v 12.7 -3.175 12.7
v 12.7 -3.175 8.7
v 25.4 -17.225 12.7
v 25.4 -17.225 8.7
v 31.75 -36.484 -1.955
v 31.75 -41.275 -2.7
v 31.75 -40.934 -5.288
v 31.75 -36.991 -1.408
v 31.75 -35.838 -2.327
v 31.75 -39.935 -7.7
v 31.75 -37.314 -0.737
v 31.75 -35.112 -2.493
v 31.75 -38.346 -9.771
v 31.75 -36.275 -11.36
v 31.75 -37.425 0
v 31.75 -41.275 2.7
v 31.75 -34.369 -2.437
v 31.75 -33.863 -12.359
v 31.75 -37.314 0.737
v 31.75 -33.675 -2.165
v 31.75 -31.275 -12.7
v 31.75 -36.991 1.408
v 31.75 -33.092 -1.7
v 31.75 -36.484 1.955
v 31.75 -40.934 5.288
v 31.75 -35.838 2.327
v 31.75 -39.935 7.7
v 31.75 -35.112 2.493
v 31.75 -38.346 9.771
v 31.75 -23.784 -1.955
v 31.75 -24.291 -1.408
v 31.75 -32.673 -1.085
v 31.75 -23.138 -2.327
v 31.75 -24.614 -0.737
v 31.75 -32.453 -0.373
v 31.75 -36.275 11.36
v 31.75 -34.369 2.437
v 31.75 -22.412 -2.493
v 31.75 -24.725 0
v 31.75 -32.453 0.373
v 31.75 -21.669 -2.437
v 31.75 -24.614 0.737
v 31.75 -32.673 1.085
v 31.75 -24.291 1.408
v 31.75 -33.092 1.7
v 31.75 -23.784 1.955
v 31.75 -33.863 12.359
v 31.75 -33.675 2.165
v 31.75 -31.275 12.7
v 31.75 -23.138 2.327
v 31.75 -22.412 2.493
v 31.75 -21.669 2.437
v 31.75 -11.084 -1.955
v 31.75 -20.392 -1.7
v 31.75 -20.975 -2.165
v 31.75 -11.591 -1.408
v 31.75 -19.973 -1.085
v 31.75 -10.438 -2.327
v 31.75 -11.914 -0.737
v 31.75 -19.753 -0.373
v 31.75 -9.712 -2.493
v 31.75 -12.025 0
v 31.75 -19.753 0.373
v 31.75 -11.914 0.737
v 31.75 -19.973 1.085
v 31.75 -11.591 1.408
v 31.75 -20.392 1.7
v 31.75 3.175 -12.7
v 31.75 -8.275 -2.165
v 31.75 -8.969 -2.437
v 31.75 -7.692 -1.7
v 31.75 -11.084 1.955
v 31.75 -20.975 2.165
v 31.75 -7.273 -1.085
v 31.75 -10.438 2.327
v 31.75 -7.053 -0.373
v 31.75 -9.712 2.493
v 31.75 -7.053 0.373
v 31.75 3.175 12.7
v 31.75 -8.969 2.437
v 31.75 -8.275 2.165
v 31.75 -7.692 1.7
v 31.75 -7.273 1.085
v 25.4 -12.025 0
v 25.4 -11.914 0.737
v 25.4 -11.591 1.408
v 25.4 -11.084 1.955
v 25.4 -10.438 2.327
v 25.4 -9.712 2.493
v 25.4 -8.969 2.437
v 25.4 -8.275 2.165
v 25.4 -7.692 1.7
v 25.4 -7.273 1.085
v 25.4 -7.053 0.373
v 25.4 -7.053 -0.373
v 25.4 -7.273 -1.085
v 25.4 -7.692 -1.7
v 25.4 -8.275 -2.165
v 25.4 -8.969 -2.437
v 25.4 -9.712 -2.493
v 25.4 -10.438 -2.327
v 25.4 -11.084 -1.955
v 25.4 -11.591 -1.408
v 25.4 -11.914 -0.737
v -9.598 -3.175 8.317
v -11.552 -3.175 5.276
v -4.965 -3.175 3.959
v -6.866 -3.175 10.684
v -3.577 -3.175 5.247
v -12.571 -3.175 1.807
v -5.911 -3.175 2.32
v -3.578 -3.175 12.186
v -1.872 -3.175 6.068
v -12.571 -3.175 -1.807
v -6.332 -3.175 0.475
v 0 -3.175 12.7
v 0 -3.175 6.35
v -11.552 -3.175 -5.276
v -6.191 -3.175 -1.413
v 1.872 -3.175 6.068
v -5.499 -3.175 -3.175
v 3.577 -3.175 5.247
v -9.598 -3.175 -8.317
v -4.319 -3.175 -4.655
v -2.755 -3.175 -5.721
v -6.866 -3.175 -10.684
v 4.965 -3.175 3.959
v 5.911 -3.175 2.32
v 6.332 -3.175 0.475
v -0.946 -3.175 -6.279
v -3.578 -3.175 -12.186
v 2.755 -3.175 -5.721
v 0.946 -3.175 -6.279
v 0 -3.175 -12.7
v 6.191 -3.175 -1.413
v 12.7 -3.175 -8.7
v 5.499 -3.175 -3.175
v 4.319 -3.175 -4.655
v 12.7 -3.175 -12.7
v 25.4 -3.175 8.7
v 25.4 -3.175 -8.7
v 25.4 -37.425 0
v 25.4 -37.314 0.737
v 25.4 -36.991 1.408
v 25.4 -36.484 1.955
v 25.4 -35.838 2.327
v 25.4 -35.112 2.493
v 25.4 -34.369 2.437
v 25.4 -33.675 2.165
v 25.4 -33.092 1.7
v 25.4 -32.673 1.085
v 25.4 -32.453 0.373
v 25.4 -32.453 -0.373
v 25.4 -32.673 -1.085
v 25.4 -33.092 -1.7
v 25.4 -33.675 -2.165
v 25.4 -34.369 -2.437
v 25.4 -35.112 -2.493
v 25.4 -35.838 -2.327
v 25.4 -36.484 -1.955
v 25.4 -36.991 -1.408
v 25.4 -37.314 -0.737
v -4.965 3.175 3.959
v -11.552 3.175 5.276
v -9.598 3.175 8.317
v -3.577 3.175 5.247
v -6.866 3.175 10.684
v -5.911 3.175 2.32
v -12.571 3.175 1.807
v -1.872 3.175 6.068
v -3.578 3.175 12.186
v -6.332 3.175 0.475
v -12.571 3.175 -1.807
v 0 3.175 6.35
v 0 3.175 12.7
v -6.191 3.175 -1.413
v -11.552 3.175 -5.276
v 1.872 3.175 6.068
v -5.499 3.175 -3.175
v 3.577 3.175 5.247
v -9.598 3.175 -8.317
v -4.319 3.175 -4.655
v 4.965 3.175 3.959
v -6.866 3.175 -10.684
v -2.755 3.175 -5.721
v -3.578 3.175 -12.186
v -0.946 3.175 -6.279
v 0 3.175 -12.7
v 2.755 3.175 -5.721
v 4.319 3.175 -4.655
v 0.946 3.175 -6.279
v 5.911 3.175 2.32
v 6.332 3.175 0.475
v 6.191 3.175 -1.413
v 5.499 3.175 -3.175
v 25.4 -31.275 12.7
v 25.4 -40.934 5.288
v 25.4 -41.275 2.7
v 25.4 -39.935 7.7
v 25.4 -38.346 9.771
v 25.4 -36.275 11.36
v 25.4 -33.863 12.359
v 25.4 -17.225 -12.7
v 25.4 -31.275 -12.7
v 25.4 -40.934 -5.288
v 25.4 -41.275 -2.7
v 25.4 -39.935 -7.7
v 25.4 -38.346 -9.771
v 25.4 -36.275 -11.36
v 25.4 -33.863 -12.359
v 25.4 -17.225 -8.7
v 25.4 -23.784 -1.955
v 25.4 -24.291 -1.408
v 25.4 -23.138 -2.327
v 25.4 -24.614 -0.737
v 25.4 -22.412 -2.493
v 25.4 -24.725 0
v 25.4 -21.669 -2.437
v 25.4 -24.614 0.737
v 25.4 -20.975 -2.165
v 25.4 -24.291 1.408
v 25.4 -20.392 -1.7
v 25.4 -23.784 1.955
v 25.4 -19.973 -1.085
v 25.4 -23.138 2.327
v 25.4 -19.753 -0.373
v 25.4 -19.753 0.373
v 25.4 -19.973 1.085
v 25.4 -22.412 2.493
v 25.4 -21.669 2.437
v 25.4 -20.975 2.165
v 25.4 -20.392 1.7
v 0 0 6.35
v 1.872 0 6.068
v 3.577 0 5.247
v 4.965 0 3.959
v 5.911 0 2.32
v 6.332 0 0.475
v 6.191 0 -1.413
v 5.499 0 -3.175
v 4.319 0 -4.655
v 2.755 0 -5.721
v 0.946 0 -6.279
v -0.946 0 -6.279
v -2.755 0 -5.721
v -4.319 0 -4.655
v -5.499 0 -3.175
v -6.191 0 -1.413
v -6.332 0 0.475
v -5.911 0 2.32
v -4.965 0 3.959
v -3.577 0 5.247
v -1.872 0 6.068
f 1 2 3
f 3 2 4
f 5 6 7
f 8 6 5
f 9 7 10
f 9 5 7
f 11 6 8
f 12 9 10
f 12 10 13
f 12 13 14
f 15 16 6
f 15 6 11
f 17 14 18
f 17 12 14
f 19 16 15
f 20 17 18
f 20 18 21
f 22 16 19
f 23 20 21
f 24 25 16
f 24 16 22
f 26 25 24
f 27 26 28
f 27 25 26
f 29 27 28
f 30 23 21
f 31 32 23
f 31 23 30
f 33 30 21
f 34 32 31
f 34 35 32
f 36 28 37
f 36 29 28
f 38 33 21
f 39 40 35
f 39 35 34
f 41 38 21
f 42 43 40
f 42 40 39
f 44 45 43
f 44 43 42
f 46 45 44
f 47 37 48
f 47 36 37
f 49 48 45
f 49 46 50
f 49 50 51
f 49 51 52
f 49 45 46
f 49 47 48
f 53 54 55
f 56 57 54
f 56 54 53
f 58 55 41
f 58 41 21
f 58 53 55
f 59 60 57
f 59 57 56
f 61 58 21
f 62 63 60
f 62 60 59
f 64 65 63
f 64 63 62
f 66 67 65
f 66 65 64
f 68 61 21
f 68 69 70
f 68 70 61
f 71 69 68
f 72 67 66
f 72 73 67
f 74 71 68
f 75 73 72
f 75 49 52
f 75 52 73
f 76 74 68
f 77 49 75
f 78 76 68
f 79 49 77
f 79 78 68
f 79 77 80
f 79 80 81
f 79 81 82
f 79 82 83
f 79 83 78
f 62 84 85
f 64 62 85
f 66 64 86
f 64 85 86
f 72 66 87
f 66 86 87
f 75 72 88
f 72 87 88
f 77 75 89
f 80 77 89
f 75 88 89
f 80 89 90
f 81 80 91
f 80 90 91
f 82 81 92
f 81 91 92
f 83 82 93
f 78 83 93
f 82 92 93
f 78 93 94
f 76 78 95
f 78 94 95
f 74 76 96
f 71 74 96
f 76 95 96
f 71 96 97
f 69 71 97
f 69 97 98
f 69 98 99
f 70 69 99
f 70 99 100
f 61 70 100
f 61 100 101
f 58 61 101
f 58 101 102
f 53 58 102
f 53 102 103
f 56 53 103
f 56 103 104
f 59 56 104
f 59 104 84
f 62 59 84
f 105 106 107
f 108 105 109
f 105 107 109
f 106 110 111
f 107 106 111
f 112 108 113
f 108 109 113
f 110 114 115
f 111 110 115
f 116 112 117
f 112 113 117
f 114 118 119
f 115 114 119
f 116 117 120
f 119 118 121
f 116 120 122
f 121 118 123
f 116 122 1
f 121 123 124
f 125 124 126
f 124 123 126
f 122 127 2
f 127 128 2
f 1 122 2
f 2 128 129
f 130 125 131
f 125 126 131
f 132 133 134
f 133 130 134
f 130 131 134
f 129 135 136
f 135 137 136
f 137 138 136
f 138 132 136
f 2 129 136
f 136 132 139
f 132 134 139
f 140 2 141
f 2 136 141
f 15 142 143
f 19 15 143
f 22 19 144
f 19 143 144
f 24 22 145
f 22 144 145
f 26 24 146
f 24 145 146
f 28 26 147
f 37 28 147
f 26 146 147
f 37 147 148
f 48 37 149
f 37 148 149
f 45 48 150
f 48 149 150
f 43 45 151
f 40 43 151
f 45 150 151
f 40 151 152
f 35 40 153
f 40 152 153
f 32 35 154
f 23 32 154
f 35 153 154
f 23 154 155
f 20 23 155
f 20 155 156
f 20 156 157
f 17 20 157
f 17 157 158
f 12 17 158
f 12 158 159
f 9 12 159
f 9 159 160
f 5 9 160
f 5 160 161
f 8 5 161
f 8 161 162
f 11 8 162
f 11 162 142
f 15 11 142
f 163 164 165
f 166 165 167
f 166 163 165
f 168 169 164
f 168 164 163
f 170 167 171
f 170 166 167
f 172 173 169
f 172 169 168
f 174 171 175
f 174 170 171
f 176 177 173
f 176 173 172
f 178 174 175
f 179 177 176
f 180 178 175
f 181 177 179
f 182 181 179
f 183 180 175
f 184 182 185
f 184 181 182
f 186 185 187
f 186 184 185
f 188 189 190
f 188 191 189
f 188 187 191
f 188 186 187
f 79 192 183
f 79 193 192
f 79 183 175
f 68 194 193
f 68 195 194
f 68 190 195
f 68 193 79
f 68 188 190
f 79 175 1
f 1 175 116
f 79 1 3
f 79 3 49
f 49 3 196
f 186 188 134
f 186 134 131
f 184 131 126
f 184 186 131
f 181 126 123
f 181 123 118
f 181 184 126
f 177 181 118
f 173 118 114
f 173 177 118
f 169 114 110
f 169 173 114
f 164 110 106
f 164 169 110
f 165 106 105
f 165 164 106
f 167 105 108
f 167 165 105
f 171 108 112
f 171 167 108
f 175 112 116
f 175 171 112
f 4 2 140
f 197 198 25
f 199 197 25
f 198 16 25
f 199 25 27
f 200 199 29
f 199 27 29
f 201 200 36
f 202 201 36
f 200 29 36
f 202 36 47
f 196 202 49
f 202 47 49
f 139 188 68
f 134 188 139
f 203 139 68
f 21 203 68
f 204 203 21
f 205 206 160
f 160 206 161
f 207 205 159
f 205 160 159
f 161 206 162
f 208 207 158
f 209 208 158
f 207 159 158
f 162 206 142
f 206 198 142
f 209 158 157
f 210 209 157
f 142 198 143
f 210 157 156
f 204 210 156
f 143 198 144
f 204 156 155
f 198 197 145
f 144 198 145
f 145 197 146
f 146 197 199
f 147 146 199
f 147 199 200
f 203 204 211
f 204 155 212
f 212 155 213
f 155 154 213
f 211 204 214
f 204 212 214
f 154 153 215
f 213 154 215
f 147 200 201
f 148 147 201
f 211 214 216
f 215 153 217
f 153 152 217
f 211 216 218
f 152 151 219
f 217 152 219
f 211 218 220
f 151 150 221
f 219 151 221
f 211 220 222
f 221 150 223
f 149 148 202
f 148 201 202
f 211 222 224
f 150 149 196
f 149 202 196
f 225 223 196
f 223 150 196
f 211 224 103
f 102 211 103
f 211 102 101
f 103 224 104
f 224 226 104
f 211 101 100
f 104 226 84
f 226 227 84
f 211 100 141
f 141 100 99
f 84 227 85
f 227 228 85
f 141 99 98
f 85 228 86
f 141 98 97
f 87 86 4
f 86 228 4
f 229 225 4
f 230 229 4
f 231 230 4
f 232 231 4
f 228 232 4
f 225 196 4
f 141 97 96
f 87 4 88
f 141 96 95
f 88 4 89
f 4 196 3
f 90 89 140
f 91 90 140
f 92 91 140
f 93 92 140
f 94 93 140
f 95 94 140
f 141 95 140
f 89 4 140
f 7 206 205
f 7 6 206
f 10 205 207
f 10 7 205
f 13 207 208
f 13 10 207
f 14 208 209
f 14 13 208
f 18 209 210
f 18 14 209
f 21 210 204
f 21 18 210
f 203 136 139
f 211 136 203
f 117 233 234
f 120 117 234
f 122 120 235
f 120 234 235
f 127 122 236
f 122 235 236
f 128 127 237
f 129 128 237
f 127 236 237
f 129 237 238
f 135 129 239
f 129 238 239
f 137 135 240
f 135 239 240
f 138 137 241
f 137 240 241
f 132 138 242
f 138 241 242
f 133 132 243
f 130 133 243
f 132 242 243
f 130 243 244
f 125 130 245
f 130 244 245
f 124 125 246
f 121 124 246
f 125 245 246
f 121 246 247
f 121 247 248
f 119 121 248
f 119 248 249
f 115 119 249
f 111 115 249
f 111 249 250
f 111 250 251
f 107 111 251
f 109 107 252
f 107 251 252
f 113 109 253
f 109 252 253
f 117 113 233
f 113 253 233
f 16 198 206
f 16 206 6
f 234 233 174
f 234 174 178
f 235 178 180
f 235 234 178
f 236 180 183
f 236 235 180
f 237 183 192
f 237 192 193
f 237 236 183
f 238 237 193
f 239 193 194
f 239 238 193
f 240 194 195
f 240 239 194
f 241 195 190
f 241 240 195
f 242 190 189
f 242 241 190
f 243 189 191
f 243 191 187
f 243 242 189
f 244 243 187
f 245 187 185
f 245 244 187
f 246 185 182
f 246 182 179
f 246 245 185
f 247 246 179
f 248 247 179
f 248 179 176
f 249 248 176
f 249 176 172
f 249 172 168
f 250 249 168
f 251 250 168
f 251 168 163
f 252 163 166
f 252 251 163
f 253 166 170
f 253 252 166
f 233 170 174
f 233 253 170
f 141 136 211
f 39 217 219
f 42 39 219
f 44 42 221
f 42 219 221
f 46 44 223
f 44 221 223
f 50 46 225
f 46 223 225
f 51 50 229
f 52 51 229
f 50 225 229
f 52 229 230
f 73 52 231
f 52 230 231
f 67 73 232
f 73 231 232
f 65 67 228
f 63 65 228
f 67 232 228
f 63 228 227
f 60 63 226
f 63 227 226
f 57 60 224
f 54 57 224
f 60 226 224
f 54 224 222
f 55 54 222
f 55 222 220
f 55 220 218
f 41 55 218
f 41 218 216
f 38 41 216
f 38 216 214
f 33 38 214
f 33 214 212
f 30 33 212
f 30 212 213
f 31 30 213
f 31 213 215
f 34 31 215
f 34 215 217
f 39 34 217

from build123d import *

# Parameters (mm, degrees)
SKETCH1_R           = 12.7
SKETCH1_R_2         = 6.35
BOSS_EXTRUDE1_DEPTH = 3.175
SKETCH2_W           = 6.35
SKETCH2_H           = 38.1
BOSS_EXTRUDE2_DEPTH = 25.4
SKETCH3_R           = 2.5
CUT_EXTRUDE1_DEPTH  = 58.589283942
FILLET1_R           = 10
RIB13_REACH         = 58.3
SKETCH4_WALL_W      = 133.538435182
SKETCH4_WALL_H      = 4


with BuildPart() as part:
    # Sketch1 → Boss-Extrude1 (new, symmetric)
    # profile 1 of 3: a face of its own
    with BuildSketch(Plane(origin=(0, 0, 0), x_dir=(1, 0, 0), z_dir=(0, 1, 0))):
        Circle(SKETCH1_R)
        with Locations(Location((0, 0, 0), (0, 0, 270))):
            Circle(SKETCH1_R_2, mode=Mode.SUBTRACT)
    # profile 2 of 3: a face of its own
    with BuildSketch(Plane(origin=(0, 0, 0), x_dir=(1, 0, 0), z_dir=(0, 1, 0))):
        with BuildLine():
            Line((31.75, 12.7), (12.7, 12.7))
            Line((12.7, 12.7), (12.7, 0))
            ThreePointArc((12.7, 0), (8.980256121, -8.980256121), (0, -12.7))
            Line((0, -12.7), (31.75, -12.7))
            Line((31.75, -12.7), (31.75, 12.7))
        make_face()
    # profile 3 of 3: a face of its own
    with BuildSketch(Plane(origin=(0, 0, 0), x_dir=(1, 0, 0), z_dir=(0, 1, 0))):
        with BuildLine():
            Line((12.7, 12.7), (0, 12.7))
            ThreePointArc((0, 12.7), (8.980256121, 8.980256121), (12.7, 0))
            Line((12.7, 0), (12.7, 12.7))
        make_face()
    extrude(amount=BOSS_EXTRUDE1_DEPTH, both=True)

    # Sketch2 → Boss-Extrude2 (add)
    with BuildSketch(Plane.XY.offset(12.7)):
        with Locations((28.575, -22.225)):
            Rectangle(SKETCH2_W, SKETCH2_H)
    extrude(amount=-BOSS_EXTRUDE2_DEPTH)

    # Sketch3 → Cut-Extrude1 (cut, through all)
    with BuildSketch(Plane.ZY.offset(-25.4)):
        with Locations(Location((0, -34.925, 0), (0, 0, 270))):
            Circle(SKETCH3_R)
        with Locations(Location((0, -9.525, 0), (0, 0, 270))):
            Circle(SKETCH3_R)
        with Locations(Location((0, -22.225, 0), (0, 0, 270))):
            Circle(SKETCH3_R)
    extrude(amount=-CUT_EXTRUDE1_DEPTH, mode=Mode.SUBTRACT)

    # Fillet1
    fillet1_edges = [part.edges().sort_by_distance(p)[0] for p in [
        (28.575, -41.275, 12.7),
        (28.575, -41.275, -12.7),
    ]]
    fillet(fillet1_edges, radius=FILLET1_R)

    # Sketch4 wall → Rib13 (add, up to next)
    with BuildSketch(Plane(origin=(19.05, -10.2, 8.7), x_dir=(0.670567611254, -0.741848420324, 0), z_dir=(0.741848420324, 0.670567611254, 0)), mode=Mode.PRIVATE) as rib13_sk1:
        with Locations((0, -2)):
            Rectangle(SKETCH4_WALL_W, SKETCH4_WALL_H)
    rib13_tool1 = extrude(rib13_sk1.sketch, amount=RIB13_REACH, mode=Mode.PRIVATE) - part.part
    rib13 = rib13_tool1.solids().sort_by_distance((19.05, -10.2, 8.7))[0]
    add(rib13)

    # Mirror1: Rib13 across plane
    add(rib13.mirror(Plane.XY))


solid = part.part
